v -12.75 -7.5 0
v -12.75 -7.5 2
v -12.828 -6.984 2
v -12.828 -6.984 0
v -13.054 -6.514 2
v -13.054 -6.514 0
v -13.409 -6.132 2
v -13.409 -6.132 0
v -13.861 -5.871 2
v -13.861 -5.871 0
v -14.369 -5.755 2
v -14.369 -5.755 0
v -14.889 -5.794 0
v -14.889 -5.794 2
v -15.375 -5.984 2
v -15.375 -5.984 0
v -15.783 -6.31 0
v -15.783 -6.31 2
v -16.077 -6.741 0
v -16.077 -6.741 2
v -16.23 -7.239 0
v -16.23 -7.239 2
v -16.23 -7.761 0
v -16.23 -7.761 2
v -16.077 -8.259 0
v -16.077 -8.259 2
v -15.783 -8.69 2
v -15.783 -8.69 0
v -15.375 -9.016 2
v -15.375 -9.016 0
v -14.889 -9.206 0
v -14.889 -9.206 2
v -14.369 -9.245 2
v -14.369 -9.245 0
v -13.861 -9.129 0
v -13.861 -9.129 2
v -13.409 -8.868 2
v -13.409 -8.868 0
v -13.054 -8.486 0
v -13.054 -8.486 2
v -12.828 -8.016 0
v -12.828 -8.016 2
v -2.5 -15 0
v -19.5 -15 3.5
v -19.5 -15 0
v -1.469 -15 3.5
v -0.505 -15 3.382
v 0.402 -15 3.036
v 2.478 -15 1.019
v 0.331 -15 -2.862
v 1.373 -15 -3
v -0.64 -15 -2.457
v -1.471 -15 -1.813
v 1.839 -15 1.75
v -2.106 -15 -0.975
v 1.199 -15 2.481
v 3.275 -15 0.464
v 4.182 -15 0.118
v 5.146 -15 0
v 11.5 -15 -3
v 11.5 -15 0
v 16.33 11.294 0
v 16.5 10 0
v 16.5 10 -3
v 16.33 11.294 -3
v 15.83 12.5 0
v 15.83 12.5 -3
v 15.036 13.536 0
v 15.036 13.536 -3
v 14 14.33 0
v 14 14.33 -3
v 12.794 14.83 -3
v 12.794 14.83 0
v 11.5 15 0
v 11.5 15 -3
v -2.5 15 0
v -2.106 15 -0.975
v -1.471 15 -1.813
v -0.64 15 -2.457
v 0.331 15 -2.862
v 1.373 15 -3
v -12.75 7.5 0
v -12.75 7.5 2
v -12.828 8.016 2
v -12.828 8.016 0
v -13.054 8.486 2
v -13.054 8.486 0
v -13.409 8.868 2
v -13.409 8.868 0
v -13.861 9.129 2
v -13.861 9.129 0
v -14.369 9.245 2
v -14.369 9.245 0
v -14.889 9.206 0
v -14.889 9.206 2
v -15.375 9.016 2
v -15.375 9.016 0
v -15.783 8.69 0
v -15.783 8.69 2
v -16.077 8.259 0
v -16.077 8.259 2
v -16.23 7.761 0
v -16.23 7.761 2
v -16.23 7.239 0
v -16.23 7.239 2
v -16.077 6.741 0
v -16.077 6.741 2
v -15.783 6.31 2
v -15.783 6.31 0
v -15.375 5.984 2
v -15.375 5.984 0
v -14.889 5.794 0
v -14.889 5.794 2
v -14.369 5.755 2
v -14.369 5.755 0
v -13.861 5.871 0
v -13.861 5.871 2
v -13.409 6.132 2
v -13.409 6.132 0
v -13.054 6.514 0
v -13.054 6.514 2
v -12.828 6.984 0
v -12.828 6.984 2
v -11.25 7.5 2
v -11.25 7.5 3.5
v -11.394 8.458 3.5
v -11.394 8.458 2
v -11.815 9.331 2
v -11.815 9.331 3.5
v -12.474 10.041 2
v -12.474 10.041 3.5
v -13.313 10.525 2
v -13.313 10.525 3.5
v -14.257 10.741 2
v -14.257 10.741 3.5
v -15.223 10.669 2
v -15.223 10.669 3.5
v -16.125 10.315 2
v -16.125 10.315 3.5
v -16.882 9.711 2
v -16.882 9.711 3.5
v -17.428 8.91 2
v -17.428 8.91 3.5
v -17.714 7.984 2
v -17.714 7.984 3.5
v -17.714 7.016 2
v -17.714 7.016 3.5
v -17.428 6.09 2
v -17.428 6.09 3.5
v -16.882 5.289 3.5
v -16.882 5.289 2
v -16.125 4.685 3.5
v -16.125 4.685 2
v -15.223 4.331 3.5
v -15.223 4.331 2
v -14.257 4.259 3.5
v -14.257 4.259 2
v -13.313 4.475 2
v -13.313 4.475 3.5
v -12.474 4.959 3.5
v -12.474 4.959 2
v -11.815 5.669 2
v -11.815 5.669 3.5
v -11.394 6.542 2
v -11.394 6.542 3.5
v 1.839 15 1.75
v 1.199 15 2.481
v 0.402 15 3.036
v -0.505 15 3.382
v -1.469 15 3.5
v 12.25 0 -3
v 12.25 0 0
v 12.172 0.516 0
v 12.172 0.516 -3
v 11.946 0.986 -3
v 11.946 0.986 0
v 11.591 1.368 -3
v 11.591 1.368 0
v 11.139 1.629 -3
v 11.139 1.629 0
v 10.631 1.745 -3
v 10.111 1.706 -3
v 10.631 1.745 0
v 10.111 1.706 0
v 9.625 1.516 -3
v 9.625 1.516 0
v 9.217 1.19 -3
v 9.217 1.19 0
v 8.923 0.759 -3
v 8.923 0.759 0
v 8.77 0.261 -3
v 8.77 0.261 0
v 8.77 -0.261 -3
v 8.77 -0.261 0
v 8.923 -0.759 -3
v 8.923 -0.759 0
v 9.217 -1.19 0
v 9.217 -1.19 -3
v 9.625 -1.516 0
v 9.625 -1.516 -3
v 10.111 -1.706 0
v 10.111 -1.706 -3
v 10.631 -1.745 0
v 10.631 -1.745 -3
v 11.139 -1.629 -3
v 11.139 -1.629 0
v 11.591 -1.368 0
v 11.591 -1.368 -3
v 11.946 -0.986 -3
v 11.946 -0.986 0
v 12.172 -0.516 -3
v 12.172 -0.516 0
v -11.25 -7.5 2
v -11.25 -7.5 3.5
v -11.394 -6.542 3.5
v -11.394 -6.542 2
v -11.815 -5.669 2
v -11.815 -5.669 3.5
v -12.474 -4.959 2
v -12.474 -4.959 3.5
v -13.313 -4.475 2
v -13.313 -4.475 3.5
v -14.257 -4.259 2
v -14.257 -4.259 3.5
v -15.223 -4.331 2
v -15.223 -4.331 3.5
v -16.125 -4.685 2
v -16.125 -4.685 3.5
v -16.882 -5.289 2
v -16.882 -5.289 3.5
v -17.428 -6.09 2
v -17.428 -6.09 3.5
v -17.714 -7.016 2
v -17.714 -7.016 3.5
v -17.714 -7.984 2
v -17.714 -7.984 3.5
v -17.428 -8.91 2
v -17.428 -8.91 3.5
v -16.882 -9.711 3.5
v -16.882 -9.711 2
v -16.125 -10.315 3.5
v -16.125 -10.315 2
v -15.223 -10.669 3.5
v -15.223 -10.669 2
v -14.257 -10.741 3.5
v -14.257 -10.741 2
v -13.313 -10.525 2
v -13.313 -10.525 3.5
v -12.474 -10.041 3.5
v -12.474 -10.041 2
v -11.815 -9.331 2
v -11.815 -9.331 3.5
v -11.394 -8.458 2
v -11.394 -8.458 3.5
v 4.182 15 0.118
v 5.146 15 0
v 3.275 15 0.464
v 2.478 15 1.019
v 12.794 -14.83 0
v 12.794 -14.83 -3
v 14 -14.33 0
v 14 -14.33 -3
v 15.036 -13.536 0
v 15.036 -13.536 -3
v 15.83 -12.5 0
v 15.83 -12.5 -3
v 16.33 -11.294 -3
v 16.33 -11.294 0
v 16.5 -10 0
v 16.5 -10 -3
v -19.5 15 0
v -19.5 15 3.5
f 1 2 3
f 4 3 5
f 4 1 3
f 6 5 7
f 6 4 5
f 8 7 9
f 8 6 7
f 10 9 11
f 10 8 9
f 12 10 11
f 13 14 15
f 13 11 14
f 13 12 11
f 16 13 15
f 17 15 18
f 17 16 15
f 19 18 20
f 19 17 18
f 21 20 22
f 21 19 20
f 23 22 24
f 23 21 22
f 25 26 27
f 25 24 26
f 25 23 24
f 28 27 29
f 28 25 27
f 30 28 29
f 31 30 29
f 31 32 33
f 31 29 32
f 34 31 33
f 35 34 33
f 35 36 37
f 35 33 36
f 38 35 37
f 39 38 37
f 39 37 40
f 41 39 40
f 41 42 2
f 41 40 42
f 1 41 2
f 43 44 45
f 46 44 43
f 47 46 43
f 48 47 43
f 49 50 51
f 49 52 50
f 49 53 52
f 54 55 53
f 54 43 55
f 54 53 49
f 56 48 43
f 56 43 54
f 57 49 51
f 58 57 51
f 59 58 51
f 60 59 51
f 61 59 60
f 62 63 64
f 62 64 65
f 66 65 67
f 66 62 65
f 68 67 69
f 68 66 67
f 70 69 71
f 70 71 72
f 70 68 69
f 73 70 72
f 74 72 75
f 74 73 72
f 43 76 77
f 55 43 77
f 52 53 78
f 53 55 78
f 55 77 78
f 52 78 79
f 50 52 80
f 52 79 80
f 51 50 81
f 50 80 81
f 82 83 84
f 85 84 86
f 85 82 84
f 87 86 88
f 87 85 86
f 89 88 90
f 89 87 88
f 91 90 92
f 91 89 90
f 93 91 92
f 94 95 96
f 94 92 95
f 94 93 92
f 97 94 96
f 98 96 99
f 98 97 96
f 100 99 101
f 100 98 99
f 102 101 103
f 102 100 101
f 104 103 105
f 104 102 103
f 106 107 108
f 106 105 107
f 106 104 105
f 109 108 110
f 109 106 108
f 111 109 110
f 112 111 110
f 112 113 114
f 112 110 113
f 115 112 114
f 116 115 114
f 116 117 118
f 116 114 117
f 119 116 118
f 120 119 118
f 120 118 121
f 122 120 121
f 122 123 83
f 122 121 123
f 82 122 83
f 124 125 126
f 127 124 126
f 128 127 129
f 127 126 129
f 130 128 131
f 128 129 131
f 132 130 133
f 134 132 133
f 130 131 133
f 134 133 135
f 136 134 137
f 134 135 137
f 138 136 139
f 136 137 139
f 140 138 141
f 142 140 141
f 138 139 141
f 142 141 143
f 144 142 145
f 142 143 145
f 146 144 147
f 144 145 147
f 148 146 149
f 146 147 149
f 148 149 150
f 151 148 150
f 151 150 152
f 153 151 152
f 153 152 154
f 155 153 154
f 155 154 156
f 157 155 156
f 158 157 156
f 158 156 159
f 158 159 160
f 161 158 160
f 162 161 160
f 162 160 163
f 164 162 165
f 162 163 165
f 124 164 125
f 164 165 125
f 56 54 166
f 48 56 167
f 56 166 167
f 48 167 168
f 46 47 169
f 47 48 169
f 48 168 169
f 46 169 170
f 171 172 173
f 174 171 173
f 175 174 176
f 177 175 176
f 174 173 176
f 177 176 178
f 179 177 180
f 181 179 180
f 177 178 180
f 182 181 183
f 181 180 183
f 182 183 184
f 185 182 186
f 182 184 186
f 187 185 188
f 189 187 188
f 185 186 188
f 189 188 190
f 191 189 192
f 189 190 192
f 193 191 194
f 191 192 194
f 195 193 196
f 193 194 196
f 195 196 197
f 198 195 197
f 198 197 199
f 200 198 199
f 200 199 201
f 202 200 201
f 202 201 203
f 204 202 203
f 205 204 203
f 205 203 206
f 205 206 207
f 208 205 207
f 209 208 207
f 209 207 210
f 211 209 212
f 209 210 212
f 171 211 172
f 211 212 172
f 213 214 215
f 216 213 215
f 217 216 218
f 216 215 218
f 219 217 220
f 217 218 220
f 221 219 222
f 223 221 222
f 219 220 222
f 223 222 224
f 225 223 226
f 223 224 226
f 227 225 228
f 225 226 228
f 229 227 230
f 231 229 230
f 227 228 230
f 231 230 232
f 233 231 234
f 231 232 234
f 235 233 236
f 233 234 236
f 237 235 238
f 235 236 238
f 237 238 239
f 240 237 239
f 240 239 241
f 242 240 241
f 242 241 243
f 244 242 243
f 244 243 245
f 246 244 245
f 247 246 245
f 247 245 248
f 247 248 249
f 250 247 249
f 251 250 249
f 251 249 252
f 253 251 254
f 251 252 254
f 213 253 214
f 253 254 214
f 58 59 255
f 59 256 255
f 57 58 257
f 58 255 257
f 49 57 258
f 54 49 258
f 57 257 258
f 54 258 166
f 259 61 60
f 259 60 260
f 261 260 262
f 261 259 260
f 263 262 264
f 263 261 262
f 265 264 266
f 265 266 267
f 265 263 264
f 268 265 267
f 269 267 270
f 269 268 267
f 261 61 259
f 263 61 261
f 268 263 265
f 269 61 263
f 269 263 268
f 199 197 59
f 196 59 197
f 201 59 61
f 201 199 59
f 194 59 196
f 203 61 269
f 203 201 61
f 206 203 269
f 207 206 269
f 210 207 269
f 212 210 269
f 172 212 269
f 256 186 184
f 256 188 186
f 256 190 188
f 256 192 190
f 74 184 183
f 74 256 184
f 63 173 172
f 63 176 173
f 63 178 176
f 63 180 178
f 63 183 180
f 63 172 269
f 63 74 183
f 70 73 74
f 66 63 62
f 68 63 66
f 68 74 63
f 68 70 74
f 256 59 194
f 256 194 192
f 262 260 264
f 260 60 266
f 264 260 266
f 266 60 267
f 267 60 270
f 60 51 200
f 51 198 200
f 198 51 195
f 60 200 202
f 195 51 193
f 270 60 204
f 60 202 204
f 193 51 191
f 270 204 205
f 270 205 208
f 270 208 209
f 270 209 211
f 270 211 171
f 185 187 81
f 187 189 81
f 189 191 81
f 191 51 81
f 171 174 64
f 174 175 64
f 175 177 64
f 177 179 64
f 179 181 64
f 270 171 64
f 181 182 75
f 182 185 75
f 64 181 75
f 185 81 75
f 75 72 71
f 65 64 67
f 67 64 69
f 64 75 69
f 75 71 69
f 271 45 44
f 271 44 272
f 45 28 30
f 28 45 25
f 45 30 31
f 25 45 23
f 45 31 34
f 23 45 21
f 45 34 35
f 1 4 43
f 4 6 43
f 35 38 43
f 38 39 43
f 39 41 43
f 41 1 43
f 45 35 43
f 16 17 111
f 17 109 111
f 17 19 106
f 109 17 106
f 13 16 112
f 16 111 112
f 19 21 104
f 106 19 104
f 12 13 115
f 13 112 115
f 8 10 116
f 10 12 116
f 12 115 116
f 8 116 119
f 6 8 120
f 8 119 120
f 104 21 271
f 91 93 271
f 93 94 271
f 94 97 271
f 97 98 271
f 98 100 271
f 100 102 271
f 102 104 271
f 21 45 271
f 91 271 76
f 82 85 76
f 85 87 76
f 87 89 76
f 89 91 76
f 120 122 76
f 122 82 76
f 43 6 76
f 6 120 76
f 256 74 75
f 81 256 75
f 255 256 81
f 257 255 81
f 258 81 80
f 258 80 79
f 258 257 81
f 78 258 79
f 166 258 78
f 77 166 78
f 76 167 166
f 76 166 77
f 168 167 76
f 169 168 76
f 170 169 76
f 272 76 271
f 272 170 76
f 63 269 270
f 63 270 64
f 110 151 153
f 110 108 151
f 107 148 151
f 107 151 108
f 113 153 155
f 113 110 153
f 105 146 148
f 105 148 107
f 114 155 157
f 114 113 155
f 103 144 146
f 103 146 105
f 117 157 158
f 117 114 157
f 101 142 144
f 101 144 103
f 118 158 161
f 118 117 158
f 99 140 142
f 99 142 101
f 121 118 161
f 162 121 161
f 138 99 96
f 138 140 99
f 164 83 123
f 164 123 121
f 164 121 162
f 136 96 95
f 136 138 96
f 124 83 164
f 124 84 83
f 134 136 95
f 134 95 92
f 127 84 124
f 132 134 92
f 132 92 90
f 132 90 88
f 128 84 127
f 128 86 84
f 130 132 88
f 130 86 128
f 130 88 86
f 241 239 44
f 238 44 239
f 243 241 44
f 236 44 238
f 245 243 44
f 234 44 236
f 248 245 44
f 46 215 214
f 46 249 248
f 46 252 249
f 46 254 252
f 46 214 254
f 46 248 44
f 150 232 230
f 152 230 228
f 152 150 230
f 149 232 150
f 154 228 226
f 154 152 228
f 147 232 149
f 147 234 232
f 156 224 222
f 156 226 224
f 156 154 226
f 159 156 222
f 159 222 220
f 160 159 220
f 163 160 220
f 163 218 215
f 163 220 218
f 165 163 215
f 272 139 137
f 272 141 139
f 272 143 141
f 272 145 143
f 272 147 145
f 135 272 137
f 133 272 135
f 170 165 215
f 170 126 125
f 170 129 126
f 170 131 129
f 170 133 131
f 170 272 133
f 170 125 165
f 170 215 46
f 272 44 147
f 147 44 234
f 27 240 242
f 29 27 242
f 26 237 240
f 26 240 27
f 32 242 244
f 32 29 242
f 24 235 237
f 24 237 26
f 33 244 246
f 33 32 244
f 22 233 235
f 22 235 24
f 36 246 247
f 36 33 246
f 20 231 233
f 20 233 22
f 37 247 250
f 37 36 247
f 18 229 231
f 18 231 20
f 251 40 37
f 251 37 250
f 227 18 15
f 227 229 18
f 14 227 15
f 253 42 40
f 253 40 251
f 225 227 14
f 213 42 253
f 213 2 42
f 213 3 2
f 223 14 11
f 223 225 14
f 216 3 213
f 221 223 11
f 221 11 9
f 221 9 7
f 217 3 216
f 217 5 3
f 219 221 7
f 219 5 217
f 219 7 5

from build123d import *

# Parameters (mm, degrees)
F0_W        = 5
F0_H        = 30
F0_W_2      = 17
F0_R        = 1.75
F1_DEPTH    = 3.5
F2_DEPTH    = 3
F3_T1_DEPTH = 49.843134833
F3_T3_DEPTH = 49.364916731
F4_R        = 3.25
F5_DEPTH    = 1.5
F6_R        = 4


# Not quite as in the source:
# - a fillet or chamfer that OpenCascade refuses, or shapes differently, is made with other operations: its cross-section is extruded or revolved along the edge and cut away or added


with BuildPart() as f1:
    # F0 (on Top) → F1 (new body)
    with BuildSketch(Plane.XY):
        Rectangle(F0_W, F0_H)
        with Locations((-11, 0)):
            Rectangle(F0_W_2, F0_H)
        with Locations((-14.5, -7.5)):
            Circle(F0_R, mode=Mode.SUBTRACT)
        with Locations((-14.5, 7.5)):
            Circle(F0_R, mode=Mode.SUBTRACT)
    extrude(amount=F1_DEPTH)

    # F0 (on Top) → F2 (join)
    with BuildSketch(Plane.XY):
        with BuildLine():
            Line((11.5, 15), (2.5, 15))
            Line((2.5, 15), (2.5, -15))
            Line((2.5, -15), (11.5, -15))
            ThreePointArc((11.5, -15), (15.0355339059, -13.5355339059), (16.5, -10))
            Line((16.5, -10), (16.5, 10))
            ThreePointArc((16.5, 10), (15.0355339059, 13.5355339059), (11.5, 15))
        make_face()
        with Locations((10.5, 0)):
            Circle(F0_R, mode=Mode.SUBTRACT)
        Rectangle(F0_W, F0_H)
    extrude(amount=-F2_DEPTH)

    # F3: fillet of radius 4 on 2 edges, made by hand

    # F3_s2 → F3_t1 (cut)
    with BuildSketch(Plane.XZ.offset(-24.9215674165)):
        with BuildLine():
            ThreePointArc((2.5, 0), (1.1771243445, 2.5), (-1.4686269666, 3.5))
            Line((-1.4686269666, 3.5), (2.5, 3.5))
            Line((2.5, 3.5), (2.5, 0))
        make_face()
    extrude(amount=F3_T1_DEPTH, mode=Mode.SUBTRACT)

    # F3_s4 → F3_t3 (cut)
    with BuildSketch(Plane.XZ.offset(-24.6824583655)):
        with BuildLine():
            ThreePointArc((-2.5, 0), (-1.0765063966, -2.1622776602), (1.3729833462, -3))
            Line((1.3729833462, -3), (-2.5, -3))
            Line((-2.5, -3), (-2.5, 0))
        make_face()
    extrude(amount=F3_T3_DEPTH, mode=Mode.SUBTRACT)

    # F4 (on face) → F5 (cut)
    with BuildSketch(Plane.XY.offset(3.5)):
        with Locations((-14.5, 7.5)):
            Circle(F4_R)
        with Locations((-14.5, -7.5)):
            Circle(F4_R)
    extrude(amount=-F5_DEPTH, mode=Mode.SUBTRACT)

    # F6
    f6_edges = [f1.edges().sort_by_distance(p)[0] for p in [
        (2.5, 0, 0),
    ]]
    fillet(f6_edges, radius=F6_R)


solid = f1.part
